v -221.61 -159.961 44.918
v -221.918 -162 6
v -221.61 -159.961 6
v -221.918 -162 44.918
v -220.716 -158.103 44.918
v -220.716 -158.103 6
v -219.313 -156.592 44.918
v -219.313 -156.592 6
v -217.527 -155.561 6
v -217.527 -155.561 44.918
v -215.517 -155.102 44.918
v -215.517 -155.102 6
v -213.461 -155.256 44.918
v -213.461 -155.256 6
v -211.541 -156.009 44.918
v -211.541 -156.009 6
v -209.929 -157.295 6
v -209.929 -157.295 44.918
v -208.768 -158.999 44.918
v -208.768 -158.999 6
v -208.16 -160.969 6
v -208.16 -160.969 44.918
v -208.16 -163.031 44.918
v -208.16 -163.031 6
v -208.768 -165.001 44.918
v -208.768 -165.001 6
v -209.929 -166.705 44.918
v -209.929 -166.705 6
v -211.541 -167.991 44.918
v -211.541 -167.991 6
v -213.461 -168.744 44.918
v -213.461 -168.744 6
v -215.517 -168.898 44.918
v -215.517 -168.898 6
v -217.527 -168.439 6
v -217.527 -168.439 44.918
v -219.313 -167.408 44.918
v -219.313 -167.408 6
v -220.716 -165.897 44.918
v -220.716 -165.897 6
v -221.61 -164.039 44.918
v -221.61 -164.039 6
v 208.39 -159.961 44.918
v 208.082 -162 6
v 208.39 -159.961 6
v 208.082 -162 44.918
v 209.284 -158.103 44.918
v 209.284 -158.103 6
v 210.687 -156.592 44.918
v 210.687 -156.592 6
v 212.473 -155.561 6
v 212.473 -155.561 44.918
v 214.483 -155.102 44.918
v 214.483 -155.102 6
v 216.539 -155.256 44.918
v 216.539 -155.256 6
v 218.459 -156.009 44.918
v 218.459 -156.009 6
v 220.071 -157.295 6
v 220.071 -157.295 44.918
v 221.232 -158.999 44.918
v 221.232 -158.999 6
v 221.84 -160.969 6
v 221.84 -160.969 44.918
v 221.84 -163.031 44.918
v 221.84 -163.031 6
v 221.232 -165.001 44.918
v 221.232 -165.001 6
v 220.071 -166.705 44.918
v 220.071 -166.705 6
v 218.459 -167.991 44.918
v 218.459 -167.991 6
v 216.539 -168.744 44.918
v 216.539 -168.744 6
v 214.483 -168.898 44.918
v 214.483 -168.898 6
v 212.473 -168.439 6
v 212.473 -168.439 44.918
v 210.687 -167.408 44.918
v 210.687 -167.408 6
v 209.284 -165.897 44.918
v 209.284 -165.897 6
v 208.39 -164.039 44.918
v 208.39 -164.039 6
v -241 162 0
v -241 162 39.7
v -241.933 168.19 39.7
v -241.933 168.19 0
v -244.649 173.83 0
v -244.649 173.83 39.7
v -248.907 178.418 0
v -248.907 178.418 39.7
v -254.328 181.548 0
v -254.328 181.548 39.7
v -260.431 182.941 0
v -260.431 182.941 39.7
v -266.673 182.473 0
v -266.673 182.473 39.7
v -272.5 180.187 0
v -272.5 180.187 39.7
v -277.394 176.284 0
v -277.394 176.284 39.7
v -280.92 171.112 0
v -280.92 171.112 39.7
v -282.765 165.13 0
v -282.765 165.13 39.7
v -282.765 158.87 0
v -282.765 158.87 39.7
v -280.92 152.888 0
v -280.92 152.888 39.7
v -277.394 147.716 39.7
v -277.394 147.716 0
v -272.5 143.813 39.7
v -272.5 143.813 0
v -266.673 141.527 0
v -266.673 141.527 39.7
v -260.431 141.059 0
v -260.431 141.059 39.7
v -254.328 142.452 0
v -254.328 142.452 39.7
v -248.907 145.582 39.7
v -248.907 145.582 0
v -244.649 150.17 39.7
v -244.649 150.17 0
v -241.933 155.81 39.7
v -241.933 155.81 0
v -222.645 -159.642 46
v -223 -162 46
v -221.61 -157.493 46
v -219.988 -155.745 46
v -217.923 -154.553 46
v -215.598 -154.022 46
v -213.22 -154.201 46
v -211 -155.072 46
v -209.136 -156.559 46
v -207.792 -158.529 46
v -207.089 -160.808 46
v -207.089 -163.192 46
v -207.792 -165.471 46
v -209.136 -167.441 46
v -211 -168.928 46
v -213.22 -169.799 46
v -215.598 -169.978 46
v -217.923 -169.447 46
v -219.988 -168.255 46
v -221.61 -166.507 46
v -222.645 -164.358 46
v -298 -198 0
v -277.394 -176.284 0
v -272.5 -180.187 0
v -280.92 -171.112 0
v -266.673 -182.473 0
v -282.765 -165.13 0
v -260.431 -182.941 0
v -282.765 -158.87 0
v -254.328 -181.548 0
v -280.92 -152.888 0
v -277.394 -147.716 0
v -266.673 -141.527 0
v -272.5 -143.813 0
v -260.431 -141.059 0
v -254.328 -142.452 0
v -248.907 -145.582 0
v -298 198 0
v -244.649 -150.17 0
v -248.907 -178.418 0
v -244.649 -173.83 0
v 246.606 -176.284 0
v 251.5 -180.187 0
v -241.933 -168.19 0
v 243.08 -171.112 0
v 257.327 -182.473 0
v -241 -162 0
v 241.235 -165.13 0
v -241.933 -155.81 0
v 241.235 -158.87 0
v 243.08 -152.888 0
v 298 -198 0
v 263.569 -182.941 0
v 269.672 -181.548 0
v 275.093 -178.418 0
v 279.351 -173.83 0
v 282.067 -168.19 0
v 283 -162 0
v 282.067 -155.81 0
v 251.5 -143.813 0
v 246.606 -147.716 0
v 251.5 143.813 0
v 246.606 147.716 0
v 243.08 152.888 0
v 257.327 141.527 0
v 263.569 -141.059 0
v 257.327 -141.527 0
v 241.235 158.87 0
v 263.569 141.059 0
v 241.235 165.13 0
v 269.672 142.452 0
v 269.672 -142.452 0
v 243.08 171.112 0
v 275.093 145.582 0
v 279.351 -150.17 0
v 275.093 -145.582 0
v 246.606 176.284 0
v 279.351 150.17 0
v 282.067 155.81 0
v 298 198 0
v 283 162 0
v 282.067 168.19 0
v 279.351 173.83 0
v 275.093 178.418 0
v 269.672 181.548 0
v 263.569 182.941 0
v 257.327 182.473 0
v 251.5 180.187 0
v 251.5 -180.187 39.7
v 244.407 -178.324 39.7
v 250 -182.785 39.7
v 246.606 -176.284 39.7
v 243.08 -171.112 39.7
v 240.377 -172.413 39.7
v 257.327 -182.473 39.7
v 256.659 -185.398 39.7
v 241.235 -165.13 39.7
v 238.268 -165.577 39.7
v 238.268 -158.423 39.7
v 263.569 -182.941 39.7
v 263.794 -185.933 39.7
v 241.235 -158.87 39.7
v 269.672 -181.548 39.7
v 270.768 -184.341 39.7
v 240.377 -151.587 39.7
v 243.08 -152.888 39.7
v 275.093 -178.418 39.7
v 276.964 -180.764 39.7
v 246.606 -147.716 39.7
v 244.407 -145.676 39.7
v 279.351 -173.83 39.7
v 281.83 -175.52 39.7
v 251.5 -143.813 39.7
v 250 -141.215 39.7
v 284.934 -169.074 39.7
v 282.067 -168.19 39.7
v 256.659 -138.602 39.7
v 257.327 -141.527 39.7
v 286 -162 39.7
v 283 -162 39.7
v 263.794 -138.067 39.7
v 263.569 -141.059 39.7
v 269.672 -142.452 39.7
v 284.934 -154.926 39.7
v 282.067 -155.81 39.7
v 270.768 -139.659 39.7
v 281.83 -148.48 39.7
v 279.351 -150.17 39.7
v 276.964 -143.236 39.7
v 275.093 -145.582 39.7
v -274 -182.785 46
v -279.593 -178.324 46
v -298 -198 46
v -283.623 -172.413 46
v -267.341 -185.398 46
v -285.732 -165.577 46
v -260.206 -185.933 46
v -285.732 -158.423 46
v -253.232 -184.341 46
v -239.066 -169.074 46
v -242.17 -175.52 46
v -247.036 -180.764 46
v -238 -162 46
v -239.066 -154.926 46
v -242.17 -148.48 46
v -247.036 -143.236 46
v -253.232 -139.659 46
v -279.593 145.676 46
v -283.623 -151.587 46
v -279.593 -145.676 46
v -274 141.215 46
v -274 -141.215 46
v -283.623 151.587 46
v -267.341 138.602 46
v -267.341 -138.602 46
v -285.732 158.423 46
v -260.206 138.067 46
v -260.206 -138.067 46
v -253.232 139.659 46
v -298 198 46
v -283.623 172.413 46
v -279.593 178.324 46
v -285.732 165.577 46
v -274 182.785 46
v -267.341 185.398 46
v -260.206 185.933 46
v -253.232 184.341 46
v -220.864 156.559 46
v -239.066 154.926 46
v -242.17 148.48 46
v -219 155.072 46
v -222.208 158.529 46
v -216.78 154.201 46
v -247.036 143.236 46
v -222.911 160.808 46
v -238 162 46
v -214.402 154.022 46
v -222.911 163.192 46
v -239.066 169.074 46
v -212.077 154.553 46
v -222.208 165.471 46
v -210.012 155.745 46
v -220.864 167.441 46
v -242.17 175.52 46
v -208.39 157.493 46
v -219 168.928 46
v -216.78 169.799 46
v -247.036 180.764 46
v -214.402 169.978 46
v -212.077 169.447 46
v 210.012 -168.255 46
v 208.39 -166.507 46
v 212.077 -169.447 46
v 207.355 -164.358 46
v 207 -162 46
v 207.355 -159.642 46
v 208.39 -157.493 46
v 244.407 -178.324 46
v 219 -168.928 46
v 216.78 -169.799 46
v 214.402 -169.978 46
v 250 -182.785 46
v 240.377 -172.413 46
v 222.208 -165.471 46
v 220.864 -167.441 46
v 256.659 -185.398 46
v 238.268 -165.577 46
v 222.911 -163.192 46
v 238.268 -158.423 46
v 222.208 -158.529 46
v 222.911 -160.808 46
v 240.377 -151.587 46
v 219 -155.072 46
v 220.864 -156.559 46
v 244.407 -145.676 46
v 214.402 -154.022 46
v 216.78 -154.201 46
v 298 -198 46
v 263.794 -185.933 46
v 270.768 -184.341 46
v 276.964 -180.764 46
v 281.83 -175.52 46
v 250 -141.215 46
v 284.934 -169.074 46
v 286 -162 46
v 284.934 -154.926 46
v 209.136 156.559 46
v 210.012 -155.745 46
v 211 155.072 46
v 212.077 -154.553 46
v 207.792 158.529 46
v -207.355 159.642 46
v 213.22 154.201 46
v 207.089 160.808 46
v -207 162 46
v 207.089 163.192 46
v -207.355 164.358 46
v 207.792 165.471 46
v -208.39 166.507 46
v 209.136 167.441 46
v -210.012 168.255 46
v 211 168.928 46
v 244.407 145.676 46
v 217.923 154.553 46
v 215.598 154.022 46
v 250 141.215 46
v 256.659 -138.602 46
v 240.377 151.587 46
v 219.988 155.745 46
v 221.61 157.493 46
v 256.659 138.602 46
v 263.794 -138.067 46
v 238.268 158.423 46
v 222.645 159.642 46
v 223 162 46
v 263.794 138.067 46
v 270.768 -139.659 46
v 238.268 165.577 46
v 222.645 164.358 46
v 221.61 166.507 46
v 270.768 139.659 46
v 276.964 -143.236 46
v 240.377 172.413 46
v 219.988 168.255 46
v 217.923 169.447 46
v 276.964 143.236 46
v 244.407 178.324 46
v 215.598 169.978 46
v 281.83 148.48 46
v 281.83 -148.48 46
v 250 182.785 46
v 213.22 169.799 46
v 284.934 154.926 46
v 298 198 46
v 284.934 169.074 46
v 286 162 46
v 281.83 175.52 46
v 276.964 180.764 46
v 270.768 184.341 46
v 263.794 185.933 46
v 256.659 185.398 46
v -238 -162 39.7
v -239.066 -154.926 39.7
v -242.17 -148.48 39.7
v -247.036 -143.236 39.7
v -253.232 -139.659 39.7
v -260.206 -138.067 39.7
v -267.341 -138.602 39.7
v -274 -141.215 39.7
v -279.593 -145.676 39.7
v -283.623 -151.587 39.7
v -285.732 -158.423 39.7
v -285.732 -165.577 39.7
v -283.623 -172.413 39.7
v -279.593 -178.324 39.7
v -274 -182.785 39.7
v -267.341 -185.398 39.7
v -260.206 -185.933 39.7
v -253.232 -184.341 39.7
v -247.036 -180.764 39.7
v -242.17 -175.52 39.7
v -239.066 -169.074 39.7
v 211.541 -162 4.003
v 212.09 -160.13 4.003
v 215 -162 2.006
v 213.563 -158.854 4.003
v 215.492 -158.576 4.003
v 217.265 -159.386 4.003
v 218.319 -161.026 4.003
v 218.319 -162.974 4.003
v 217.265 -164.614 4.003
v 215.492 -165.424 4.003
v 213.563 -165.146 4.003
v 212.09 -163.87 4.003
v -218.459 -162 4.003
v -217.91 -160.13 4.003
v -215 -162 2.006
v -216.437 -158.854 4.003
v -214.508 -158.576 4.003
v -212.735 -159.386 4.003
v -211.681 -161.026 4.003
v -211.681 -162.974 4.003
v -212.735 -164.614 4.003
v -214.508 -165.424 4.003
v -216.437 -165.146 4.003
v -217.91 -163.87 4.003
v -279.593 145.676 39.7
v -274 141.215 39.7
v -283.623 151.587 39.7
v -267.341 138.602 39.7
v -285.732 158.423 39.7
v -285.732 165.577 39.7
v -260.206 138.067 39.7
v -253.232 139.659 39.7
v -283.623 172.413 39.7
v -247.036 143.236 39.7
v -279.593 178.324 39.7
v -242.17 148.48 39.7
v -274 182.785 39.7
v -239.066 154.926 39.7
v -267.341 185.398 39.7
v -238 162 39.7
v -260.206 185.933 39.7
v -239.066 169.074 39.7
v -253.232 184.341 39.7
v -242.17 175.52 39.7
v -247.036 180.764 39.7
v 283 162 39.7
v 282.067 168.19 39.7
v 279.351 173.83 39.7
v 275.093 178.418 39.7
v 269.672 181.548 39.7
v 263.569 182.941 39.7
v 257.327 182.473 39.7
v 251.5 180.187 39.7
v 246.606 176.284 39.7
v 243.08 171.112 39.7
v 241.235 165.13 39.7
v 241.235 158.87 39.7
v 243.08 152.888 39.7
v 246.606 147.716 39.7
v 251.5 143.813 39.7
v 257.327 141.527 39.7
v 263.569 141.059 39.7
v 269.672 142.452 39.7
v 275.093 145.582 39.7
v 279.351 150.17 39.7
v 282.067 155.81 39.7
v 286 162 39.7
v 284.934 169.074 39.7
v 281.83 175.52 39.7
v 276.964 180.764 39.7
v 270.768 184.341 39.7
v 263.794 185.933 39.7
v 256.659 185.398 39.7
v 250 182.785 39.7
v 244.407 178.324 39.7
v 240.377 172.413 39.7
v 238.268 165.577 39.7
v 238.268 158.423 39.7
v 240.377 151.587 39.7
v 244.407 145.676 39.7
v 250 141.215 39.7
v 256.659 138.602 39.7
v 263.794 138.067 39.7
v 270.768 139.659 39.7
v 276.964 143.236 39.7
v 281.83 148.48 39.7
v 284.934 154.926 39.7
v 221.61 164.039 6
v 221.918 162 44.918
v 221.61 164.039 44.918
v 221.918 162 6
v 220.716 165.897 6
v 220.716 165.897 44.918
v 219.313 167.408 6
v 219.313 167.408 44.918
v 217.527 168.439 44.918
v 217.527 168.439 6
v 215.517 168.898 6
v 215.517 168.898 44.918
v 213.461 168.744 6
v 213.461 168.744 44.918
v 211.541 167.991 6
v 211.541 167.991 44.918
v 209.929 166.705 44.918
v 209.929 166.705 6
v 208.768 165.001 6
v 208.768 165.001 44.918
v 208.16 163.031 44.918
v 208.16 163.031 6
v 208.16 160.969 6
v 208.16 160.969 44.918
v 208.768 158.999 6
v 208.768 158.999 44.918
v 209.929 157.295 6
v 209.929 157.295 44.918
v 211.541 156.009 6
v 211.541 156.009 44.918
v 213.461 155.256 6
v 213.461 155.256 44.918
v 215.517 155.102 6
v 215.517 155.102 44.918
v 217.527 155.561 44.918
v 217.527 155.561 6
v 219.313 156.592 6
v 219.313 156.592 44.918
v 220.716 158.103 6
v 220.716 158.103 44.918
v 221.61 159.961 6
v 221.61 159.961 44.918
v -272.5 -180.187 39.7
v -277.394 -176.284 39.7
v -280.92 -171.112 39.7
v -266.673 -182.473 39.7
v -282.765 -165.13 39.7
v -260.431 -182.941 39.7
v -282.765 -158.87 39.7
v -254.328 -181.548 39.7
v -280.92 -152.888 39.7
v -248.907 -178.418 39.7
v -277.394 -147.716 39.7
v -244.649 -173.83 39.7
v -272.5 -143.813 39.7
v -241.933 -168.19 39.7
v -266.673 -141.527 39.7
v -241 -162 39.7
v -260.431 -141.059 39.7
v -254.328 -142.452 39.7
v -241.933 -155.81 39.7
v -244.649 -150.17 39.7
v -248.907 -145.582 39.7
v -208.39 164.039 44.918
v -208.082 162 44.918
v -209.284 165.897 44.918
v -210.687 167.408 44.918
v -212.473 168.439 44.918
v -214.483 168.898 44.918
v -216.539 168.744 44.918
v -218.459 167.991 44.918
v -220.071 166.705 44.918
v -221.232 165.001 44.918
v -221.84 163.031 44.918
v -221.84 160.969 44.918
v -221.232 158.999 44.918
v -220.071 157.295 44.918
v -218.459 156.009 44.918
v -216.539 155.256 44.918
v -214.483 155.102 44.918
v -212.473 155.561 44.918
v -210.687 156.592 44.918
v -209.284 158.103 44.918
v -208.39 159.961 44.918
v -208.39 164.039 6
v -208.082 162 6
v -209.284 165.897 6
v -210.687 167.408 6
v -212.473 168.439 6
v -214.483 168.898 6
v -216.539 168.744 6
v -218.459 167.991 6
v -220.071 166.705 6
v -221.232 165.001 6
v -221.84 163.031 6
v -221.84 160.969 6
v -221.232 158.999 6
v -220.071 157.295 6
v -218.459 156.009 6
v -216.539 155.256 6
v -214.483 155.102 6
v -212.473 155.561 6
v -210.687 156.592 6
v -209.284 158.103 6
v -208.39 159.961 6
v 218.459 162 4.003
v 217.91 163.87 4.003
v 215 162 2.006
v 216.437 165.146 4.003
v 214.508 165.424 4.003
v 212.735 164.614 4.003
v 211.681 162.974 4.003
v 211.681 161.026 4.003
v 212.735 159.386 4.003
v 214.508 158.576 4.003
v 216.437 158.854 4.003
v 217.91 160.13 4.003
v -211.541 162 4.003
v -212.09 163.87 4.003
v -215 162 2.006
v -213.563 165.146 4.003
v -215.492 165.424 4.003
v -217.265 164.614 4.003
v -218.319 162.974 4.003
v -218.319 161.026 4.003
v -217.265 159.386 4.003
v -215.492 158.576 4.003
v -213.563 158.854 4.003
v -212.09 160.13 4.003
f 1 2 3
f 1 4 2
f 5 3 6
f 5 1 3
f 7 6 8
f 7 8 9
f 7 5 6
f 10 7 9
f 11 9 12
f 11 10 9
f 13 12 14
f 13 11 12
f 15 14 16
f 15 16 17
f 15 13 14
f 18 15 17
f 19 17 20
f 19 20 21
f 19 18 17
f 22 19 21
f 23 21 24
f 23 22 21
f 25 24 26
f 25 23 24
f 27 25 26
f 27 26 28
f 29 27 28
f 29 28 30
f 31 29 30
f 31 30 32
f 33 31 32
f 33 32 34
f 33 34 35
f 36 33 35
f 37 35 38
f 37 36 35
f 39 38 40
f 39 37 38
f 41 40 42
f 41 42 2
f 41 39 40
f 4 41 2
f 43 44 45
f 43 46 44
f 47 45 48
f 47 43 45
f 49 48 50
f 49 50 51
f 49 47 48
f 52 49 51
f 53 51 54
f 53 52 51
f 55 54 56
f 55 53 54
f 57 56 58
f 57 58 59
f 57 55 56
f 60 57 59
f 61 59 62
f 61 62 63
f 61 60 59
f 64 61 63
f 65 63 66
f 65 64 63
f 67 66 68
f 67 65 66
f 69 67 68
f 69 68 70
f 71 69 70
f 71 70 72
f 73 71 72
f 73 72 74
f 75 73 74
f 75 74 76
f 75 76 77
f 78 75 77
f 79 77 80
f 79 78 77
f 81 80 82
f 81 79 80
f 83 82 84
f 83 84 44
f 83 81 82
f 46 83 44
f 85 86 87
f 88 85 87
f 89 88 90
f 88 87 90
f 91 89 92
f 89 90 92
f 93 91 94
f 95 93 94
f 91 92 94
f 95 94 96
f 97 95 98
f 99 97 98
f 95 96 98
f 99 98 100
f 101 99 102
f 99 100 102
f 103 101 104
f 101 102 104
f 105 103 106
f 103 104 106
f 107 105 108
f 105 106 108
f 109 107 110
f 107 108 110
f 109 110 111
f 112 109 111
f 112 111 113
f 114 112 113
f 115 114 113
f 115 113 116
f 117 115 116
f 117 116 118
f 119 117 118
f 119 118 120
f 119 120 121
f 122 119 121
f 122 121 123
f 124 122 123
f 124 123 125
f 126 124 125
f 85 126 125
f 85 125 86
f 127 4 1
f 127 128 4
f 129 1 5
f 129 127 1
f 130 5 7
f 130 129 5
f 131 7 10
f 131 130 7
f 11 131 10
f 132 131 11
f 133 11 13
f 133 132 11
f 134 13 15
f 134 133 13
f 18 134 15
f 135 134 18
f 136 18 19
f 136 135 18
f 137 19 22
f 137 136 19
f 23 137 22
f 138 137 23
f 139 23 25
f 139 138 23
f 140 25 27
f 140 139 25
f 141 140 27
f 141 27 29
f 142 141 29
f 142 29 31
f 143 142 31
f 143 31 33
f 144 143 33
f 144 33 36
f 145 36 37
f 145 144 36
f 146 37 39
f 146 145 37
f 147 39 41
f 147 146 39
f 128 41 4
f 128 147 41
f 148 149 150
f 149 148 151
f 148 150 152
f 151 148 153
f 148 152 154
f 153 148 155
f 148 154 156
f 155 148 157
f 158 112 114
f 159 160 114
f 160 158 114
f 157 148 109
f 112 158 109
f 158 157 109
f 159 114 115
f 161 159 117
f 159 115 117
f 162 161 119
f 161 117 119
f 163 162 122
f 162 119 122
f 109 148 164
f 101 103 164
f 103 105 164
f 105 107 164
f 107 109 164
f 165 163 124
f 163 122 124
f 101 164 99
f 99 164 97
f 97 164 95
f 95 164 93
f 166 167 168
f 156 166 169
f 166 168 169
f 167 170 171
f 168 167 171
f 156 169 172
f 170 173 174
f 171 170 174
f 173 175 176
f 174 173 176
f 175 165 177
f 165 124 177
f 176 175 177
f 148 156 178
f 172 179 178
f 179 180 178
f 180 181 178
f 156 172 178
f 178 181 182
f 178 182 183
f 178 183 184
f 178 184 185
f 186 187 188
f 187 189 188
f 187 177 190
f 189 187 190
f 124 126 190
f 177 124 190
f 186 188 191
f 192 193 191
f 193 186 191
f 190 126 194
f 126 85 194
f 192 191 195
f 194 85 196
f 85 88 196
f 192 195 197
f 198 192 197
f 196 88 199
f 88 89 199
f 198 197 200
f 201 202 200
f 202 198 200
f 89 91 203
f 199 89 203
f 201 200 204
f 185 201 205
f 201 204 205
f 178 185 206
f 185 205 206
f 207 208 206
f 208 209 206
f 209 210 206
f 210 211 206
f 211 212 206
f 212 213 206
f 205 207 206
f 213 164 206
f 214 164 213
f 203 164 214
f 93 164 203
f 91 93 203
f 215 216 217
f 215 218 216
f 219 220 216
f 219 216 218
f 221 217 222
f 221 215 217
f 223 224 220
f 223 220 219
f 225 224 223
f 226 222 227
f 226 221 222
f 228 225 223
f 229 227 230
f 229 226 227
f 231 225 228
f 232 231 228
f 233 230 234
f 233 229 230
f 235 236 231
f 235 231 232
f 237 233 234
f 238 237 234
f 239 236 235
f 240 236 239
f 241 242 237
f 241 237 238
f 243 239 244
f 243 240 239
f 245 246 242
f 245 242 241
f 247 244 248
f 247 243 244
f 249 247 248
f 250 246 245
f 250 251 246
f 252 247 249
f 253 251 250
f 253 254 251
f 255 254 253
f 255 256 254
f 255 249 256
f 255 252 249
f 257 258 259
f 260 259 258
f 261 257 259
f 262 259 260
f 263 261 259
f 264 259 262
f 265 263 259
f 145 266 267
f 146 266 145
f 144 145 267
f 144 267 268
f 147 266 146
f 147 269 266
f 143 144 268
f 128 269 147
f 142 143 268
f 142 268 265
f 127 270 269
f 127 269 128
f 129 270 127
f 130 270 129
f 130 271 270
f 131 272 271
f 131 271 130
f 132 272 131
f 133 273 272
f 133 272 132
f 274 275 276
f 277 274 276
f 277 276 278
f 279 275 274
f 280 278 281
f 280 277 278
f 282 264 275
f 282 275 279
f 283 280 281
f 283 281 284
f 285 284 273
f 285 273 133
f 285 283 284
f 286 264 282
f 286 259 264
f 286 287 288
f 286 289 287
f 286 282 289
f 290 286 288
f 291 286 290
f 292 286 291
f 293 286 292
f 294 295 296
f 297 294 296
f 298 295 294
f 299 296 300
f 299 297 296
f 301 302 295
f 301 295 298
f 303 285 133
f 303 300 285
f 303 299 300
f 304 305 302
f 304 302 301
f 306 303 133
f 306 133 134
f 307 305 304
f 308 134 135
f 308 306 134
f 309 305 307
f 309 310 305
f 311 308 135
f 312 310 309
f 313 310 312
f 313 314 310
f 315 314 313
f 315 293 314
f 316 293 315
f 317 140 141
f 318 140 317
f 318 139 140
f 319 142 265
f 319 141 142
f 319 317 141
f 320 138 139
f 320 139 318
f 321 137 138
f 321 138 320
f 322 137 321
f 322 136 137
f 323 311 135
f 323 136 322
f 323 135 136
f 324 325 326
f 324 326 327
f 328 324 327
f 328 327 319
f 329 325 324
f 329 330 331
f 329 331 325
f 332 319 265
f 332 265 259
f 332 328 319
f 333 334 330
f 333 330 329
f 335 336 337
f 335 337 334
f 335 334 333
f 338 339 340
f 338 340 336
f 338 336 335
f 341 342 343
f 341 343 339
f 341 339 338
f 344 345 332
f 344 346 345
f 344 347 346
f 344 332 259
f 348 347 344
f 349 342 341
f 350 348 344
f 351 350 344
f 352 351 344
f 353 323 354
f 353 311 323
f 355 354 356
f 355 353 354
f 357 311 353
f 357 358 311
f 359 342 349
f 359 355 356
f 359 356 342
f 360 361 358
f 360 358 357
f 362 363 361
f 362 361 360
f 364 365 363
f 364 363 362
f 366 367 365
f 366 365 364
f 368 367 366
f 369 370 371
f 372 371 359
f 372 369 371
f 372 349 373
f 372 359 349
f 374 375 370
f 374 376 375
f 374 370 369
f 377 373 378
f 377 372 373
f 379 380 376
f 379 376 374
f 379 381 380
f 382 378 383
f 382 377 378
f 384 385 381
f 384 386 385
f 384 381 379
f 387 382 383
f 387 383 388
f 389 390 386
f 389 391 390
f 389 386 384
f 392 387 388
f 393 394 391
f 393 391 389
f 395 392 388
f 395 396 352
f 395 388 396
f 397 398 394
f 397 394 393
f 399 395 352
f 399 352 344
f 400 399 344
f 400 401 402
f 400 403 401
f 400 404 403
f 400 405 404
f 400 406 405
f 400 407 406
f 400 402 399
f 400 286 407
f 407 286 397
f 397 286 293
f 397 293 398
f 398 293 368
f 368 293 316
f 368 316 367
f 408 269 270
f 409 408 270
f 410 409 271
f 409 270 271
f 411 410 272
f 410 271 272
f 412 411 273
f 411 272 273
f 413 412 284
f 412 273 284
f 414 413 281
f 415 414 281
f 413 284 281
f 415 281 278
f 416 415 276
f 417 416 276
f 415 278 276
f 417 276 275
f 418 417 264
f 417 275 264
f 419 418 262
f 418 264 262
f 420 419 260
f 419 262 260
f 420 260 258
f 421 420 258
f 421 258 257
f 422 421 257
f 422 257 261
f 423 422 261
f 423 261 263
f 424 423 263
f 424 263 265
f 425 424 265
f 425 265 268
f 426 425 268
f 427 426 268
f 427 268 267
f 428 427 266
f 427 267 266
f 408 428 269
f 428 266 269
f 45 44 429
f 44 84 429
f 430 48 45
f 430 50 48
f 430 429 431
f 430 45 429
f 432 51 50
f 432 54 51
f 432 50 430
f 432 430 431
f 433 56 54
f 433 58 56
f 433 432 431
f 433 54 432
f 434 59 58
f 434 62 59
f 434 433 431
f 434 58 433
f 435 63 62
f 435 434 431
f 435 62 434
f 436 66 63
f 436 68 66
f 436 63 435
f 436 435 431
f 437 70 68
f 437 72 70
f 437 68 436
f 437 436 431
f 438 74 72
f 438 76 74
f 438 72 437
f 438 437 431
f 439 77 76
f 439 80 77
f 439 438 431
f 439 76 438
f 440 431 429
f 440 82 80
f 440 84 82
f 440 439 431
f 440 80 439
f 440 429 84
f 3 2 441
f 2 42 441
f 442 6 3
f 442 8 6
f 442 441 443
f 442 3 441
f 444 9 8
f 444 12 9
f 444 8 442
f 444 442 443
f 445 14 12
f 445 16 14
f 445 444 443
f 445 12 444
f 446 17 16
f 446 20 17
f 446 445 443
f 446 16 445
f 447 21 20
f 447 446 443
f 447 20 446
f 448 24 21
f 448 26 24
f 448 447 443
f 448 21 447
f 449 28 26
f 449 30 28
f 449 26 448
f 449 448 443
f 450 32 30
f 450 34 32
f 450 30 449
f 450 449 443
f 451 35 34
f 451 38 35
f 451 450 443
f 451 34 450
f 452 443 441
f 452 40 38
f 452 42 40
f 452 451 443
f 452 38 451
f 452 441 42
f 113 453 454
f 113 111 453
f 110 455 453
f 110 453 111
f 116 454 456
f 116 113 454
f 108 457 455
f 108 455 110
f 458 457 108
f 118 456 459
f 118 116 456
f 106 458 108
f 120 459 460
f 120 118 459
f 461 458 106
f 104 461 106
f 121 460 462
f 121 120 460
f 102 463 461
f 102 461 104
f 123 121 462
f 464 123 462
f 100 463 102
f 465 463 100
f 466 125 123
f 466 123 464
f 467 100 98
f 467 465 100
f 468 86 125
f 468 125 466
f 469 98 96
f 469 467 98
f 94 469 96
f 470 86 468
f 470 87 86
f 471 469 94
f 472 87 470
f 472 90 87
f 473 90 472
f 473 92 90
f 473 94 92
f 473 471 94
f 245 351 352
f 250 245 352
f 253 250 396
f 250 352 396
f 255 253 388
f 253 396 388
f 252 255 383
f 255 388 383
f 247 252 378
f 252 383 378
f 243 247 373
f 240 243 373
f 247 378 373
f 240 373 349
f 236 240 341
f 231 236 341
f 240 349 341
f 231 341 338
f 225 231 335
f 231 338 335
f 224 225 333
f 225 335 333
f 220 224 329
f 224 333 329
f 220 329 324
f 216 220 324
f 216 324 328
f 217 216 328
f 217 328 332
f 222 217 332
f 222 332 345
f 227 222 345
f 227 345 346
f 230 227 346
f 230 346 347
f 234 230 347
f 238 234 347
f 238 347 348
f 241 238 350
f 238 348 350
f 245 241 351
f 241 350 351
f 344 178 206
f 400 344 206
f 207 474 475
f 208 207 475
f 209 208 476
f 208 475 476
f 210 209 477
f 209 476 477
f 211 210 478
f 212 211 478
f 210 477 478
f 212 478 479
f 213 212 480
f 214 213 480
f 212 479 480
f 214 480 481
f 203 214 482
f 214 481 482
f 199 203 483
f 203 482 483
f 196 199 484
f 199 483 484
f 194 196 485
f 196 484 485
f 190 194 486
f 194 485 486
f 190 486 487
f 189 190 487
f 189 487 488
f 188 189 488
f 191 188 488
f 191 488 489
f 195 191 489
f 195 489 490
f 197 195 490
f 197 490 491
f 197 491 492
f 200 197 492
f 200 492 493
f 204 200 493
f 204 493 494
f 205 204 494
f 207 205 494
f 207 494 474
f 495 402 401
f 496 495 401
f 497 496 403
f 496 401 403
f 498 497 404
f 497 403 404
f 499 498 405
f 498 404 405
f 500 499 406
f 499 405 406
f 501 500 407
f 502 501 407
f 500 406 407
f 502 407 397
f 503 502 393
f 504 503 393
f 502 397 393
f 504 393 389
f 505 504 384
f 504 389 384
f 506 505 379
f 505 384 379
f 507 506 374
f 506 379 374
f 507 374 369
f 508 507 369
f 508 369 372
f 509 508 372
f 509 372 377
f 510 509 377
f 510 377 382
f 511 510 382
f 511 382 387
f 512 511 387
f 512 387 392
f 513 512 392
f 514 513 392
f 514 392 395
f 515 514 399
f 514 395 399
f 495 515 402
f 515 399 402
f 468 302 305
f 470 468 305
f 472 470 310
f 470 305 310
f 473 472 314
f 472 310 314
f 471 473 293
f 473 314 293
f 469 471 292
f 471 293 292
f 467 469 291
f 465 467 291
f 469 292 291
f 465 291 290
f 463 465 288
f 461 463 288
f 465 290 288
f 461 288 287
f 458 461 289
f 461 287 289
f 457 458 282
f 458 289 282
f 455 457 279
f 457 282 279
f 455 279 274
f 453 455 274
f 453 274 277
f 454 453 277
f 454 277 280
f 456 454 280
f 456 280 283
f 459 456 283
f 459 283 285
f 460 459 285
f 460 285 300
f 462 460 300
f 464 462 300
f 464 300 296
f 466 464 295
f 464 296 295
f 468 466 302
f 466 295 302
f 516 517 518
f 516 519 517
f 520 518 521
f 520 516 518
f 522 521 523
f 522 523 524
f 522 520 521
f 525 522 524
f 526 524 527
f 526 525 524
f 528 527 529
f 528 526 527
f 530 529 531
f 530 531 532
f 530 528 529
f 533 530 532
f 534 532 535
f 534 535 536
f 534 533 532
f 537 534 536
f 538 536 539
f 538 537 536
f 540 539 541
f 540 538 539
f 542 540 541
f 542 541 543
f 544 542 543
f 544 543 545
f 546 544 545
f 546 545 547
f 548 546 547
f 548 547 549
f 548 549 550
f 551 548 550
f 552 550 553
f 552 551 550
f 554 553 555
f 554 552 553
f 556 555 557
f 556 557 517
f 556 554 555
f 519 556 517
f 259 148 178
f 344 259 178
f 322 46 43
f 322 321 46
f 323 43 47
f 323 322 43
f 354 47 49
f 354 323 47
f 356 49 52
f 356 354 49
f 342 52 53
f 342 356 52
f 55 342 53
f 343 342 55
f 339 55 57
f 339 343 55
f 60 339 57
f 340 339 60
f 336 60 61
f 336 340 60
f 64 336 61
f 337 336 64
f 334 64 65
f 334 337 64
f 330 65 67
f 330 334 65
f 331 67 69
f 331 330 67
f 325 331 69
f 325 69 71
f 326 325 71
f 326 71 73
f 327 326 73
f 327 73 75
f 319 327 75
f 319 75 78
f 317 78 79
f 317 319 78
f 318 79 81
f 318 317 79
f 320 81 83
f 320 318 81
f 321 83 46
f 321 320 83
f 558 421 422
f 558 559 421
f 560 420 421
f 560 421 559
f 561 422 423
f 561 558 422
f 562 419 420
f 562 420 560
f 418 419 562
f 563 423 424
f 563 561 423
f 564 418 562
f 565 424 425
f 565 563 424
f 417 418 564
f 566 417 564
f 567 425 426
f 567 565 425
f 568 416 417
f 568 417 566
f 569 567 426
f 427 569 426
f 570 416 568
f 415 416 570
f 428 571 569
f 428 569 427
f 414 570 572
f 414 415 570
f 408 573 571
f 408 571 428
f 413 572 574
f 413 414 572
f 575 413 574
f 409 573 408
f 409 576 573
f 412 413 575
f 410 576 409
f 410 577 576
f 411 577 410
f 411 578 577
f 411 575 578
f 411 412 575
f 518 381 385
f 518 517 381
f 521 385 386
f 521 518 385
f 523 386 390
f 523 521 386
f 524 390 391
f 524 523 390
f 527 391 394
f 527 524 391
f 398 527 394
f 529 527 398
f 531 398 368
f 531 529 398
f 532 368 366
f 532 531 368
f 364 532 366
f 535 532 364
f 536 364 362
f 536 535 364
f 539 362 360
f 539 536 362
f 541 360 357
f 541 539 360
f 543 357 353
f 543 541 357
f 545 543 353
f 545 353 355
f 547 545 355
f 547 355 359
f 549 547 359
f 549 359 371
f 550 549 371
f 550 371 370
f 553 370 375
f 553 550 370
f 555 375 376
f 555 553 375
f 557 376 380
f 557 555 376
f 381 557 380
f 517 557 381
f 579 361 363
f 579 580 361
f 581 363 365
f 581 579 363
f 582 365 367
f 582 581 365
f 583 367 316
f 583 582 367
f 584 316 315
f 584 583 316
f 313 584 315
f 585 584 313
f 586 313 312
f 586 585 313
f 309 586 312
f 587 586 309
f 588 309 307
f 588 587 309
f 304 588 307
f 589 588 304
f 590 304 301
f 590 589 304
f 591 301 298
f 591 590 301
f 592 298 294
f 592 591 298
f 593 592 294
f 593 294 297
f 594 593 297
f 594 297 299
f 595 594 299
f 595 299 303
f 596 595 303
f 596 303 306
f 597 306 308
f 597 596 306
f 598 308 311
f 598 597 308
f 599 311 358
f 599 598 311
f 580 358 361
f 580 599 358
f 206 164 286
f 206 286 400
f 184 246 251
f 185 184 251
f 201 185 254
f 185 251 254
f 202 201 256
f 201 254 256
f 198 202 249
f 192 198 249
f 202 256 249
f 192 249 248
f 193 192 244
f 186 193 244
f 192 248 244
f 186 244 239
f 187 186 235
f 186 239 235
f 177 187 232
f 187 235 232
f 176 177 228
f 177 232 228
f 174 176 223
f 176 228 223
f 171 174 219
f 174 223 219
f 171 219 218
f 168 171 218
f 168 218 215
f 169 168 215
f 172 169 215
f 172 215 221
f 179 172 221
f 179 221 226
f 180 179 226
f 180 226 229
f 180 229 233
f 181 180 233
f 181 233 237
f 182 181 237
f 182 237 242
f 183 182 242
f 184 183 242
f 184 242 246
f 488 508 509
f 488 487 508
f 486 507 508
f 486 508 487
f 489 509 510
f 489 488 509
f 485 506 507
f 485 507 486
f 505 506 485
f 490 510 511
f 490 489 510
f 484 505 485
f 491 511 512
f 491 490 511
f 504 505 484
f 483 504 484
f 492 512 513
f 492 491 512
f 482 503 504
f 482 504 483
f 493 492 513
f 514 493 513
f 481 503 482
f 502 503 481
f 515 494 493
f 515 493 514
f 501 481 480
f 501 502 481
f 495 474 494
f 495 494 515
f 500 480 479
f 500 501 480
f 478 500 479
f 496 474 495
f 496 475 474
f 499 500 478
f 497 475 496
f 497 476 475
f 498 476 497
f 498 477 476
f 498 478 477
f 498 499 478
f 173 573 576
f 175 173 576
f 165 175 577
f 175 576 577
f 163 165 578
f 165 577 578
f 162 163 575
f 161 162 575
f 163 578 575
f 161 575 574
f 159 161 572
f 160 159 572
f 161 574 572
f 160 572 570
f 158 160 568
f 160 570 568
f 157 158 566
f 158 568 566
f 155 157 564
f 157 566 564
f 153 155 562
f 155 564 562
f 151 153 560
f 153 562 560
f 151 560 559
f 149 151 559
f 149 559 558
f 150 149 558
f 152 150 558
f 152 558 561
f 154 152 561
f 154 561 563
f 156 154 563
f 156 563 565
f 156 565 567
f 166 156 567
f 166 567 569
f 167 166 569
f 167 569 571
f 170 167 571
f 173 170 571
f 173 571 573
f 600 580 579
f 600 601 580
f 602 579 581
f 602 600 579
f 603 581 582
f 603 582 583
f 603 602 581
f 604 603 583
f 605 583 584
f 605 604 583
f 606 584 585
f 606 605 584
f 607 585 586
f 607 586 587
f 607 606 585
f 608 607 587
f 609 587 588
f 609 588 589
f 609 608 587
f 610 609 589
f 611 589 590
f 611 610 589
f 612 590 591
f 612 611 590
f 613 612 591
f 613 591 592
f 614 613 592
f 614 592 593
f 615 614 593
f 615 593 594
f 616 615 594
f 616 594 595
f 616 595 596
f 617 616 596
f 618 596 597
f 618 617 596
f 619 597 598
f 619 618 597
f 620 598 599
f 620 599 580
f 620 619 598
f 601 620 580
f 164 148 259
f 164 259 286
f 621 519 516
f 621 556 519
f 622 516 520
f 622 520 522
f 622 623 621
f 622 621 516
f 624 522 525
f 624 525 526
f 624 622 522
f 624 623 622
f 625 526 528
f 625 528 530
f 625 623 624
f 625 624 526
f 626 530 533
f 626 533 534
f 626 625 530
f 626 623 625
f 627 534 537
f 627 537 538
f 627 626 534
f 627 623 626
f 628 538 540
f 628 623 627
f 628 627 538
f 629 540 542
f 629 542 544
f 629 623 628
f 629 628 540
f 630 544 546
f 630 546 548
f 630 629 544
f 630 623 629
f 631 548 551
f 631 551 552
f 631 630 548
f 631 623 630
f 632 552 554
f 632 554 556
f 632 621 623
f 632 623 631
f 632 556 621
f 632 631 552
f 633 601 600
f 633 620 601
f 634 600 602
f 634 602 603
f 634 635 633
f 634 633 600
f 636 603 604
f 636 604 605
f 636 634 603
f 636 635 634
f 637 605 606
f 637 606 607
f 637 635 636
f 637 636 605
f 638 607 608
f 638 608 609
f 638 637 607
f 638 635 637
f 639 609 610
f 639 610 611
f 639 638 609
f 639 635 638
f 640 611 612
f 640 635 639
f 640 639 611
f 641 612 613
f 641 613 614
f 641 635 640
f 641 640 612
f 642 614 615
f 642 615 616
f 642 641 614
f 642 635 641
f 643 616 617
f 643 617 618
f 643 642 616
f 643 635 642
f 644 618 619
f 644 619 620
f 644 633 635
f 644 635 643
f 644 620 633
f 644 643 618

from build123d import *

# Parameters (mm, degrees)
SZKIC1_W                    = 596
SZKIC1_H                    = 396
DODANIE_WYCI_GNI_CIE1_DEPTH = 46
SZKIC2_R                    = 21
WYTNIJ_WYCI_GNI_CIE1_DEPTH  = 46
SZKIC3_R                    = 21
WYTNIJ_WYCI_GNI_CIE2_DEPTH  = 46
SZKIC4_R                    = 21
WYTNIJ_WYCI_GNI_CIE3_DEPTH  = 46
SZKIC5_R                    = 21
WYTNIJ_WYCI_GNI_CIE4_DEPTH  = 46
SZKIC6_R                    = 24
WYTNIJ_WYCI_GNI_CIE5_DEPTH  = 6.3
SZKIC7_R                    = 24
WYTNIJ_WYCI_GNI_CIE6_DEPTH  = 6.3
SZKIC8_R                    = 24
WYTNIJ_WYCI_GNI_CIE7_DEPTH  = 6.3
SZKIC9_R                    = 24
WYTNIJ_WYCI_GNI_CIE8_DEPTH  = 6.3


with BuildPart() as part:
    # Szkic1 → Dodanie-wyciągnięcie1 (new body)
    with BuildSketch(Plane.XY):
        Rectangle(SZKIC1_W, SZKIC1_H)
    extrude(amount=DODANIE_WYCI_GNI_CIE1_DEPTH)

    # Szkic2 → Wytnij-wyciągnięcie1 (cut)
    with BuildSketch(Plane.XY.offset(46)):
        with Locations((262, 162)):
            Circle(SZKIC2_R)
    extrude(amount=-WYTNIJ_WYCI_GNI_CIE1_DEPTH, mode=Mode.SUBTRACT)

    # Szkic3 → Wytnij-wyciągnięcie2 (cut)
    with BuildSketch(Plane.XY.offset(46)):
        with Locations((262, -162)):
            Circle(SZKIC3_R)
    extrude(amount=-WYTNIJ_WYCI_GNI_CIE2_DEPTH, mode=Mode.SUBTRACT)

    # Szkic4 → Wytnij-wyciągnięcie3 (cut)
    with BuildSketch(Plane.XY.offset(46)):
        with Locations((-262, -162)):
            Circle(SZKIC4_R)
    extrude(amount=-WYTNIJ_WYCI_GNI_CIE3_DEPTH, mode=Mode.SUBTRACT)

    # Szkic5 → Wytnij-wyciągnięcie4 (cut)
    with BuildSketch(Plane.XY.offset(46)):
        with Locations((-262, 162)):
            Circle(SZKIC5_R)
    extrude(amount=-WYTNIJ_WYCI_GNI_CIE4_DEPTH, mode=Mode.SUBTRACT)

    # Szkic6 → Wytnij-wyciągnięcie5 (cut)
    with BuildSketch(Plane.XY.offset(46)):
        with Locations((-262, 162)):
            Circle(SZKIC6_R)
    extrude(amount=-WYTNIJ_WYCI_GNI_CIE5_DEPTH, mode=Mode.SUBTRACT)

    # Szkic7 → Wytnij-wyciągnięcie6 (cut)
    with BuildSketch(Plane.XY.offset(46)):
        with Locations((262, 162)):
            Circle(SZKIC7_R)
    extrude(amount=-WYTNIJ_WYCI_GNI_CIE6_DEPTH, mode=Mode.SUBTRACT)

    # Szkic8 → Wytnij-wyciągnięcie7 (cut)
    with BuildSketch(Plane.XY.offset(46)):
        with Locations((-262, -162)):
            Circle(SZKIC8_R)
    extrude(amount=-WYTNIJ_WYCI_GNI_CIE7_DEPTH, mode=Mode.SUBTRACT)

    # Szkic9 → Wytnij-wyciągnięcie8 (cut)
    with BuildSketch(Plane.XY.offset(46)):
        with Locations((262, -162)):
            Circle(SZKIC9_R)
    extrude(amount=-WYTNIJ_WYCI_GNI_CIE8_DEPTH, mode=Mode.SUBTRACT)

    # Szkic10 → Wycięcie-obrót1 (revolve, cut)
    with BuildSketch(Plane(origin=(-215, 0, 0), x_dir=(0, 0, -1), z_dir=(1, 0, 0))):
        Polygon((-46, 162), (-46, 170), (-44.9175, 168.9175), (-6, 168.9175), (-2.006179513, 162), align=None)
    revolve(axis=Axis((-215, 162, 2.006179513), (0, 0, 1)), mode=Mode.SUBTRACT)

    # Szkic11 → Wycięcie-obrót2 (revolve, cut)
    with BuildSketch(Plane(origin=(-215, 0, 0), x_dir=(0, 0, -1), z_dir=(1, 0, 0))):
        Polygon((-2.006179513, -162), (-6, -168.9175), (-44.9175, -168.9175), (-46, -170), (-46, -162), align=None)
    revolve(axis=Axis((-215, -162, 46), (0, 0, -1)), mode=Mode.SUBTRACT)

    # Szkic12 → Wycięcie-obrót3 (revolve, cut)
    with BuildSketch(Plane(origin=(215, 0, 0), x_dir=(0, 0, -1), z_dir=(1, 0, 0))):
        Polygon((-46, 162), (-46, 170), (-44.9175, 168.9175), (-6, 168.9175), (-2.006179513, 162), align=None)
    revolve(axis=Axis((215, 162, 2.006179513), (0, 0, 1)), mode=Mode.SUBTRACT)

    # Szkic13 → Wycięcie-obrót4 (revolve, cut)
    with BuildSketch(Plane(origin=(215, 0, 0), x_dir=(0, 0, -1), z_dir=(1, 0, 0))):
        Polygon((-2.006179513, -162), (-6, -168.9175), (-44.9175, -168.9175), (-46, -170), (-46, -162), align=None)
    revolve(axis=Axis((215, -162, 46), (0, 0, -1)), mode=Mode.SUBTRACT)


solid = part.part
